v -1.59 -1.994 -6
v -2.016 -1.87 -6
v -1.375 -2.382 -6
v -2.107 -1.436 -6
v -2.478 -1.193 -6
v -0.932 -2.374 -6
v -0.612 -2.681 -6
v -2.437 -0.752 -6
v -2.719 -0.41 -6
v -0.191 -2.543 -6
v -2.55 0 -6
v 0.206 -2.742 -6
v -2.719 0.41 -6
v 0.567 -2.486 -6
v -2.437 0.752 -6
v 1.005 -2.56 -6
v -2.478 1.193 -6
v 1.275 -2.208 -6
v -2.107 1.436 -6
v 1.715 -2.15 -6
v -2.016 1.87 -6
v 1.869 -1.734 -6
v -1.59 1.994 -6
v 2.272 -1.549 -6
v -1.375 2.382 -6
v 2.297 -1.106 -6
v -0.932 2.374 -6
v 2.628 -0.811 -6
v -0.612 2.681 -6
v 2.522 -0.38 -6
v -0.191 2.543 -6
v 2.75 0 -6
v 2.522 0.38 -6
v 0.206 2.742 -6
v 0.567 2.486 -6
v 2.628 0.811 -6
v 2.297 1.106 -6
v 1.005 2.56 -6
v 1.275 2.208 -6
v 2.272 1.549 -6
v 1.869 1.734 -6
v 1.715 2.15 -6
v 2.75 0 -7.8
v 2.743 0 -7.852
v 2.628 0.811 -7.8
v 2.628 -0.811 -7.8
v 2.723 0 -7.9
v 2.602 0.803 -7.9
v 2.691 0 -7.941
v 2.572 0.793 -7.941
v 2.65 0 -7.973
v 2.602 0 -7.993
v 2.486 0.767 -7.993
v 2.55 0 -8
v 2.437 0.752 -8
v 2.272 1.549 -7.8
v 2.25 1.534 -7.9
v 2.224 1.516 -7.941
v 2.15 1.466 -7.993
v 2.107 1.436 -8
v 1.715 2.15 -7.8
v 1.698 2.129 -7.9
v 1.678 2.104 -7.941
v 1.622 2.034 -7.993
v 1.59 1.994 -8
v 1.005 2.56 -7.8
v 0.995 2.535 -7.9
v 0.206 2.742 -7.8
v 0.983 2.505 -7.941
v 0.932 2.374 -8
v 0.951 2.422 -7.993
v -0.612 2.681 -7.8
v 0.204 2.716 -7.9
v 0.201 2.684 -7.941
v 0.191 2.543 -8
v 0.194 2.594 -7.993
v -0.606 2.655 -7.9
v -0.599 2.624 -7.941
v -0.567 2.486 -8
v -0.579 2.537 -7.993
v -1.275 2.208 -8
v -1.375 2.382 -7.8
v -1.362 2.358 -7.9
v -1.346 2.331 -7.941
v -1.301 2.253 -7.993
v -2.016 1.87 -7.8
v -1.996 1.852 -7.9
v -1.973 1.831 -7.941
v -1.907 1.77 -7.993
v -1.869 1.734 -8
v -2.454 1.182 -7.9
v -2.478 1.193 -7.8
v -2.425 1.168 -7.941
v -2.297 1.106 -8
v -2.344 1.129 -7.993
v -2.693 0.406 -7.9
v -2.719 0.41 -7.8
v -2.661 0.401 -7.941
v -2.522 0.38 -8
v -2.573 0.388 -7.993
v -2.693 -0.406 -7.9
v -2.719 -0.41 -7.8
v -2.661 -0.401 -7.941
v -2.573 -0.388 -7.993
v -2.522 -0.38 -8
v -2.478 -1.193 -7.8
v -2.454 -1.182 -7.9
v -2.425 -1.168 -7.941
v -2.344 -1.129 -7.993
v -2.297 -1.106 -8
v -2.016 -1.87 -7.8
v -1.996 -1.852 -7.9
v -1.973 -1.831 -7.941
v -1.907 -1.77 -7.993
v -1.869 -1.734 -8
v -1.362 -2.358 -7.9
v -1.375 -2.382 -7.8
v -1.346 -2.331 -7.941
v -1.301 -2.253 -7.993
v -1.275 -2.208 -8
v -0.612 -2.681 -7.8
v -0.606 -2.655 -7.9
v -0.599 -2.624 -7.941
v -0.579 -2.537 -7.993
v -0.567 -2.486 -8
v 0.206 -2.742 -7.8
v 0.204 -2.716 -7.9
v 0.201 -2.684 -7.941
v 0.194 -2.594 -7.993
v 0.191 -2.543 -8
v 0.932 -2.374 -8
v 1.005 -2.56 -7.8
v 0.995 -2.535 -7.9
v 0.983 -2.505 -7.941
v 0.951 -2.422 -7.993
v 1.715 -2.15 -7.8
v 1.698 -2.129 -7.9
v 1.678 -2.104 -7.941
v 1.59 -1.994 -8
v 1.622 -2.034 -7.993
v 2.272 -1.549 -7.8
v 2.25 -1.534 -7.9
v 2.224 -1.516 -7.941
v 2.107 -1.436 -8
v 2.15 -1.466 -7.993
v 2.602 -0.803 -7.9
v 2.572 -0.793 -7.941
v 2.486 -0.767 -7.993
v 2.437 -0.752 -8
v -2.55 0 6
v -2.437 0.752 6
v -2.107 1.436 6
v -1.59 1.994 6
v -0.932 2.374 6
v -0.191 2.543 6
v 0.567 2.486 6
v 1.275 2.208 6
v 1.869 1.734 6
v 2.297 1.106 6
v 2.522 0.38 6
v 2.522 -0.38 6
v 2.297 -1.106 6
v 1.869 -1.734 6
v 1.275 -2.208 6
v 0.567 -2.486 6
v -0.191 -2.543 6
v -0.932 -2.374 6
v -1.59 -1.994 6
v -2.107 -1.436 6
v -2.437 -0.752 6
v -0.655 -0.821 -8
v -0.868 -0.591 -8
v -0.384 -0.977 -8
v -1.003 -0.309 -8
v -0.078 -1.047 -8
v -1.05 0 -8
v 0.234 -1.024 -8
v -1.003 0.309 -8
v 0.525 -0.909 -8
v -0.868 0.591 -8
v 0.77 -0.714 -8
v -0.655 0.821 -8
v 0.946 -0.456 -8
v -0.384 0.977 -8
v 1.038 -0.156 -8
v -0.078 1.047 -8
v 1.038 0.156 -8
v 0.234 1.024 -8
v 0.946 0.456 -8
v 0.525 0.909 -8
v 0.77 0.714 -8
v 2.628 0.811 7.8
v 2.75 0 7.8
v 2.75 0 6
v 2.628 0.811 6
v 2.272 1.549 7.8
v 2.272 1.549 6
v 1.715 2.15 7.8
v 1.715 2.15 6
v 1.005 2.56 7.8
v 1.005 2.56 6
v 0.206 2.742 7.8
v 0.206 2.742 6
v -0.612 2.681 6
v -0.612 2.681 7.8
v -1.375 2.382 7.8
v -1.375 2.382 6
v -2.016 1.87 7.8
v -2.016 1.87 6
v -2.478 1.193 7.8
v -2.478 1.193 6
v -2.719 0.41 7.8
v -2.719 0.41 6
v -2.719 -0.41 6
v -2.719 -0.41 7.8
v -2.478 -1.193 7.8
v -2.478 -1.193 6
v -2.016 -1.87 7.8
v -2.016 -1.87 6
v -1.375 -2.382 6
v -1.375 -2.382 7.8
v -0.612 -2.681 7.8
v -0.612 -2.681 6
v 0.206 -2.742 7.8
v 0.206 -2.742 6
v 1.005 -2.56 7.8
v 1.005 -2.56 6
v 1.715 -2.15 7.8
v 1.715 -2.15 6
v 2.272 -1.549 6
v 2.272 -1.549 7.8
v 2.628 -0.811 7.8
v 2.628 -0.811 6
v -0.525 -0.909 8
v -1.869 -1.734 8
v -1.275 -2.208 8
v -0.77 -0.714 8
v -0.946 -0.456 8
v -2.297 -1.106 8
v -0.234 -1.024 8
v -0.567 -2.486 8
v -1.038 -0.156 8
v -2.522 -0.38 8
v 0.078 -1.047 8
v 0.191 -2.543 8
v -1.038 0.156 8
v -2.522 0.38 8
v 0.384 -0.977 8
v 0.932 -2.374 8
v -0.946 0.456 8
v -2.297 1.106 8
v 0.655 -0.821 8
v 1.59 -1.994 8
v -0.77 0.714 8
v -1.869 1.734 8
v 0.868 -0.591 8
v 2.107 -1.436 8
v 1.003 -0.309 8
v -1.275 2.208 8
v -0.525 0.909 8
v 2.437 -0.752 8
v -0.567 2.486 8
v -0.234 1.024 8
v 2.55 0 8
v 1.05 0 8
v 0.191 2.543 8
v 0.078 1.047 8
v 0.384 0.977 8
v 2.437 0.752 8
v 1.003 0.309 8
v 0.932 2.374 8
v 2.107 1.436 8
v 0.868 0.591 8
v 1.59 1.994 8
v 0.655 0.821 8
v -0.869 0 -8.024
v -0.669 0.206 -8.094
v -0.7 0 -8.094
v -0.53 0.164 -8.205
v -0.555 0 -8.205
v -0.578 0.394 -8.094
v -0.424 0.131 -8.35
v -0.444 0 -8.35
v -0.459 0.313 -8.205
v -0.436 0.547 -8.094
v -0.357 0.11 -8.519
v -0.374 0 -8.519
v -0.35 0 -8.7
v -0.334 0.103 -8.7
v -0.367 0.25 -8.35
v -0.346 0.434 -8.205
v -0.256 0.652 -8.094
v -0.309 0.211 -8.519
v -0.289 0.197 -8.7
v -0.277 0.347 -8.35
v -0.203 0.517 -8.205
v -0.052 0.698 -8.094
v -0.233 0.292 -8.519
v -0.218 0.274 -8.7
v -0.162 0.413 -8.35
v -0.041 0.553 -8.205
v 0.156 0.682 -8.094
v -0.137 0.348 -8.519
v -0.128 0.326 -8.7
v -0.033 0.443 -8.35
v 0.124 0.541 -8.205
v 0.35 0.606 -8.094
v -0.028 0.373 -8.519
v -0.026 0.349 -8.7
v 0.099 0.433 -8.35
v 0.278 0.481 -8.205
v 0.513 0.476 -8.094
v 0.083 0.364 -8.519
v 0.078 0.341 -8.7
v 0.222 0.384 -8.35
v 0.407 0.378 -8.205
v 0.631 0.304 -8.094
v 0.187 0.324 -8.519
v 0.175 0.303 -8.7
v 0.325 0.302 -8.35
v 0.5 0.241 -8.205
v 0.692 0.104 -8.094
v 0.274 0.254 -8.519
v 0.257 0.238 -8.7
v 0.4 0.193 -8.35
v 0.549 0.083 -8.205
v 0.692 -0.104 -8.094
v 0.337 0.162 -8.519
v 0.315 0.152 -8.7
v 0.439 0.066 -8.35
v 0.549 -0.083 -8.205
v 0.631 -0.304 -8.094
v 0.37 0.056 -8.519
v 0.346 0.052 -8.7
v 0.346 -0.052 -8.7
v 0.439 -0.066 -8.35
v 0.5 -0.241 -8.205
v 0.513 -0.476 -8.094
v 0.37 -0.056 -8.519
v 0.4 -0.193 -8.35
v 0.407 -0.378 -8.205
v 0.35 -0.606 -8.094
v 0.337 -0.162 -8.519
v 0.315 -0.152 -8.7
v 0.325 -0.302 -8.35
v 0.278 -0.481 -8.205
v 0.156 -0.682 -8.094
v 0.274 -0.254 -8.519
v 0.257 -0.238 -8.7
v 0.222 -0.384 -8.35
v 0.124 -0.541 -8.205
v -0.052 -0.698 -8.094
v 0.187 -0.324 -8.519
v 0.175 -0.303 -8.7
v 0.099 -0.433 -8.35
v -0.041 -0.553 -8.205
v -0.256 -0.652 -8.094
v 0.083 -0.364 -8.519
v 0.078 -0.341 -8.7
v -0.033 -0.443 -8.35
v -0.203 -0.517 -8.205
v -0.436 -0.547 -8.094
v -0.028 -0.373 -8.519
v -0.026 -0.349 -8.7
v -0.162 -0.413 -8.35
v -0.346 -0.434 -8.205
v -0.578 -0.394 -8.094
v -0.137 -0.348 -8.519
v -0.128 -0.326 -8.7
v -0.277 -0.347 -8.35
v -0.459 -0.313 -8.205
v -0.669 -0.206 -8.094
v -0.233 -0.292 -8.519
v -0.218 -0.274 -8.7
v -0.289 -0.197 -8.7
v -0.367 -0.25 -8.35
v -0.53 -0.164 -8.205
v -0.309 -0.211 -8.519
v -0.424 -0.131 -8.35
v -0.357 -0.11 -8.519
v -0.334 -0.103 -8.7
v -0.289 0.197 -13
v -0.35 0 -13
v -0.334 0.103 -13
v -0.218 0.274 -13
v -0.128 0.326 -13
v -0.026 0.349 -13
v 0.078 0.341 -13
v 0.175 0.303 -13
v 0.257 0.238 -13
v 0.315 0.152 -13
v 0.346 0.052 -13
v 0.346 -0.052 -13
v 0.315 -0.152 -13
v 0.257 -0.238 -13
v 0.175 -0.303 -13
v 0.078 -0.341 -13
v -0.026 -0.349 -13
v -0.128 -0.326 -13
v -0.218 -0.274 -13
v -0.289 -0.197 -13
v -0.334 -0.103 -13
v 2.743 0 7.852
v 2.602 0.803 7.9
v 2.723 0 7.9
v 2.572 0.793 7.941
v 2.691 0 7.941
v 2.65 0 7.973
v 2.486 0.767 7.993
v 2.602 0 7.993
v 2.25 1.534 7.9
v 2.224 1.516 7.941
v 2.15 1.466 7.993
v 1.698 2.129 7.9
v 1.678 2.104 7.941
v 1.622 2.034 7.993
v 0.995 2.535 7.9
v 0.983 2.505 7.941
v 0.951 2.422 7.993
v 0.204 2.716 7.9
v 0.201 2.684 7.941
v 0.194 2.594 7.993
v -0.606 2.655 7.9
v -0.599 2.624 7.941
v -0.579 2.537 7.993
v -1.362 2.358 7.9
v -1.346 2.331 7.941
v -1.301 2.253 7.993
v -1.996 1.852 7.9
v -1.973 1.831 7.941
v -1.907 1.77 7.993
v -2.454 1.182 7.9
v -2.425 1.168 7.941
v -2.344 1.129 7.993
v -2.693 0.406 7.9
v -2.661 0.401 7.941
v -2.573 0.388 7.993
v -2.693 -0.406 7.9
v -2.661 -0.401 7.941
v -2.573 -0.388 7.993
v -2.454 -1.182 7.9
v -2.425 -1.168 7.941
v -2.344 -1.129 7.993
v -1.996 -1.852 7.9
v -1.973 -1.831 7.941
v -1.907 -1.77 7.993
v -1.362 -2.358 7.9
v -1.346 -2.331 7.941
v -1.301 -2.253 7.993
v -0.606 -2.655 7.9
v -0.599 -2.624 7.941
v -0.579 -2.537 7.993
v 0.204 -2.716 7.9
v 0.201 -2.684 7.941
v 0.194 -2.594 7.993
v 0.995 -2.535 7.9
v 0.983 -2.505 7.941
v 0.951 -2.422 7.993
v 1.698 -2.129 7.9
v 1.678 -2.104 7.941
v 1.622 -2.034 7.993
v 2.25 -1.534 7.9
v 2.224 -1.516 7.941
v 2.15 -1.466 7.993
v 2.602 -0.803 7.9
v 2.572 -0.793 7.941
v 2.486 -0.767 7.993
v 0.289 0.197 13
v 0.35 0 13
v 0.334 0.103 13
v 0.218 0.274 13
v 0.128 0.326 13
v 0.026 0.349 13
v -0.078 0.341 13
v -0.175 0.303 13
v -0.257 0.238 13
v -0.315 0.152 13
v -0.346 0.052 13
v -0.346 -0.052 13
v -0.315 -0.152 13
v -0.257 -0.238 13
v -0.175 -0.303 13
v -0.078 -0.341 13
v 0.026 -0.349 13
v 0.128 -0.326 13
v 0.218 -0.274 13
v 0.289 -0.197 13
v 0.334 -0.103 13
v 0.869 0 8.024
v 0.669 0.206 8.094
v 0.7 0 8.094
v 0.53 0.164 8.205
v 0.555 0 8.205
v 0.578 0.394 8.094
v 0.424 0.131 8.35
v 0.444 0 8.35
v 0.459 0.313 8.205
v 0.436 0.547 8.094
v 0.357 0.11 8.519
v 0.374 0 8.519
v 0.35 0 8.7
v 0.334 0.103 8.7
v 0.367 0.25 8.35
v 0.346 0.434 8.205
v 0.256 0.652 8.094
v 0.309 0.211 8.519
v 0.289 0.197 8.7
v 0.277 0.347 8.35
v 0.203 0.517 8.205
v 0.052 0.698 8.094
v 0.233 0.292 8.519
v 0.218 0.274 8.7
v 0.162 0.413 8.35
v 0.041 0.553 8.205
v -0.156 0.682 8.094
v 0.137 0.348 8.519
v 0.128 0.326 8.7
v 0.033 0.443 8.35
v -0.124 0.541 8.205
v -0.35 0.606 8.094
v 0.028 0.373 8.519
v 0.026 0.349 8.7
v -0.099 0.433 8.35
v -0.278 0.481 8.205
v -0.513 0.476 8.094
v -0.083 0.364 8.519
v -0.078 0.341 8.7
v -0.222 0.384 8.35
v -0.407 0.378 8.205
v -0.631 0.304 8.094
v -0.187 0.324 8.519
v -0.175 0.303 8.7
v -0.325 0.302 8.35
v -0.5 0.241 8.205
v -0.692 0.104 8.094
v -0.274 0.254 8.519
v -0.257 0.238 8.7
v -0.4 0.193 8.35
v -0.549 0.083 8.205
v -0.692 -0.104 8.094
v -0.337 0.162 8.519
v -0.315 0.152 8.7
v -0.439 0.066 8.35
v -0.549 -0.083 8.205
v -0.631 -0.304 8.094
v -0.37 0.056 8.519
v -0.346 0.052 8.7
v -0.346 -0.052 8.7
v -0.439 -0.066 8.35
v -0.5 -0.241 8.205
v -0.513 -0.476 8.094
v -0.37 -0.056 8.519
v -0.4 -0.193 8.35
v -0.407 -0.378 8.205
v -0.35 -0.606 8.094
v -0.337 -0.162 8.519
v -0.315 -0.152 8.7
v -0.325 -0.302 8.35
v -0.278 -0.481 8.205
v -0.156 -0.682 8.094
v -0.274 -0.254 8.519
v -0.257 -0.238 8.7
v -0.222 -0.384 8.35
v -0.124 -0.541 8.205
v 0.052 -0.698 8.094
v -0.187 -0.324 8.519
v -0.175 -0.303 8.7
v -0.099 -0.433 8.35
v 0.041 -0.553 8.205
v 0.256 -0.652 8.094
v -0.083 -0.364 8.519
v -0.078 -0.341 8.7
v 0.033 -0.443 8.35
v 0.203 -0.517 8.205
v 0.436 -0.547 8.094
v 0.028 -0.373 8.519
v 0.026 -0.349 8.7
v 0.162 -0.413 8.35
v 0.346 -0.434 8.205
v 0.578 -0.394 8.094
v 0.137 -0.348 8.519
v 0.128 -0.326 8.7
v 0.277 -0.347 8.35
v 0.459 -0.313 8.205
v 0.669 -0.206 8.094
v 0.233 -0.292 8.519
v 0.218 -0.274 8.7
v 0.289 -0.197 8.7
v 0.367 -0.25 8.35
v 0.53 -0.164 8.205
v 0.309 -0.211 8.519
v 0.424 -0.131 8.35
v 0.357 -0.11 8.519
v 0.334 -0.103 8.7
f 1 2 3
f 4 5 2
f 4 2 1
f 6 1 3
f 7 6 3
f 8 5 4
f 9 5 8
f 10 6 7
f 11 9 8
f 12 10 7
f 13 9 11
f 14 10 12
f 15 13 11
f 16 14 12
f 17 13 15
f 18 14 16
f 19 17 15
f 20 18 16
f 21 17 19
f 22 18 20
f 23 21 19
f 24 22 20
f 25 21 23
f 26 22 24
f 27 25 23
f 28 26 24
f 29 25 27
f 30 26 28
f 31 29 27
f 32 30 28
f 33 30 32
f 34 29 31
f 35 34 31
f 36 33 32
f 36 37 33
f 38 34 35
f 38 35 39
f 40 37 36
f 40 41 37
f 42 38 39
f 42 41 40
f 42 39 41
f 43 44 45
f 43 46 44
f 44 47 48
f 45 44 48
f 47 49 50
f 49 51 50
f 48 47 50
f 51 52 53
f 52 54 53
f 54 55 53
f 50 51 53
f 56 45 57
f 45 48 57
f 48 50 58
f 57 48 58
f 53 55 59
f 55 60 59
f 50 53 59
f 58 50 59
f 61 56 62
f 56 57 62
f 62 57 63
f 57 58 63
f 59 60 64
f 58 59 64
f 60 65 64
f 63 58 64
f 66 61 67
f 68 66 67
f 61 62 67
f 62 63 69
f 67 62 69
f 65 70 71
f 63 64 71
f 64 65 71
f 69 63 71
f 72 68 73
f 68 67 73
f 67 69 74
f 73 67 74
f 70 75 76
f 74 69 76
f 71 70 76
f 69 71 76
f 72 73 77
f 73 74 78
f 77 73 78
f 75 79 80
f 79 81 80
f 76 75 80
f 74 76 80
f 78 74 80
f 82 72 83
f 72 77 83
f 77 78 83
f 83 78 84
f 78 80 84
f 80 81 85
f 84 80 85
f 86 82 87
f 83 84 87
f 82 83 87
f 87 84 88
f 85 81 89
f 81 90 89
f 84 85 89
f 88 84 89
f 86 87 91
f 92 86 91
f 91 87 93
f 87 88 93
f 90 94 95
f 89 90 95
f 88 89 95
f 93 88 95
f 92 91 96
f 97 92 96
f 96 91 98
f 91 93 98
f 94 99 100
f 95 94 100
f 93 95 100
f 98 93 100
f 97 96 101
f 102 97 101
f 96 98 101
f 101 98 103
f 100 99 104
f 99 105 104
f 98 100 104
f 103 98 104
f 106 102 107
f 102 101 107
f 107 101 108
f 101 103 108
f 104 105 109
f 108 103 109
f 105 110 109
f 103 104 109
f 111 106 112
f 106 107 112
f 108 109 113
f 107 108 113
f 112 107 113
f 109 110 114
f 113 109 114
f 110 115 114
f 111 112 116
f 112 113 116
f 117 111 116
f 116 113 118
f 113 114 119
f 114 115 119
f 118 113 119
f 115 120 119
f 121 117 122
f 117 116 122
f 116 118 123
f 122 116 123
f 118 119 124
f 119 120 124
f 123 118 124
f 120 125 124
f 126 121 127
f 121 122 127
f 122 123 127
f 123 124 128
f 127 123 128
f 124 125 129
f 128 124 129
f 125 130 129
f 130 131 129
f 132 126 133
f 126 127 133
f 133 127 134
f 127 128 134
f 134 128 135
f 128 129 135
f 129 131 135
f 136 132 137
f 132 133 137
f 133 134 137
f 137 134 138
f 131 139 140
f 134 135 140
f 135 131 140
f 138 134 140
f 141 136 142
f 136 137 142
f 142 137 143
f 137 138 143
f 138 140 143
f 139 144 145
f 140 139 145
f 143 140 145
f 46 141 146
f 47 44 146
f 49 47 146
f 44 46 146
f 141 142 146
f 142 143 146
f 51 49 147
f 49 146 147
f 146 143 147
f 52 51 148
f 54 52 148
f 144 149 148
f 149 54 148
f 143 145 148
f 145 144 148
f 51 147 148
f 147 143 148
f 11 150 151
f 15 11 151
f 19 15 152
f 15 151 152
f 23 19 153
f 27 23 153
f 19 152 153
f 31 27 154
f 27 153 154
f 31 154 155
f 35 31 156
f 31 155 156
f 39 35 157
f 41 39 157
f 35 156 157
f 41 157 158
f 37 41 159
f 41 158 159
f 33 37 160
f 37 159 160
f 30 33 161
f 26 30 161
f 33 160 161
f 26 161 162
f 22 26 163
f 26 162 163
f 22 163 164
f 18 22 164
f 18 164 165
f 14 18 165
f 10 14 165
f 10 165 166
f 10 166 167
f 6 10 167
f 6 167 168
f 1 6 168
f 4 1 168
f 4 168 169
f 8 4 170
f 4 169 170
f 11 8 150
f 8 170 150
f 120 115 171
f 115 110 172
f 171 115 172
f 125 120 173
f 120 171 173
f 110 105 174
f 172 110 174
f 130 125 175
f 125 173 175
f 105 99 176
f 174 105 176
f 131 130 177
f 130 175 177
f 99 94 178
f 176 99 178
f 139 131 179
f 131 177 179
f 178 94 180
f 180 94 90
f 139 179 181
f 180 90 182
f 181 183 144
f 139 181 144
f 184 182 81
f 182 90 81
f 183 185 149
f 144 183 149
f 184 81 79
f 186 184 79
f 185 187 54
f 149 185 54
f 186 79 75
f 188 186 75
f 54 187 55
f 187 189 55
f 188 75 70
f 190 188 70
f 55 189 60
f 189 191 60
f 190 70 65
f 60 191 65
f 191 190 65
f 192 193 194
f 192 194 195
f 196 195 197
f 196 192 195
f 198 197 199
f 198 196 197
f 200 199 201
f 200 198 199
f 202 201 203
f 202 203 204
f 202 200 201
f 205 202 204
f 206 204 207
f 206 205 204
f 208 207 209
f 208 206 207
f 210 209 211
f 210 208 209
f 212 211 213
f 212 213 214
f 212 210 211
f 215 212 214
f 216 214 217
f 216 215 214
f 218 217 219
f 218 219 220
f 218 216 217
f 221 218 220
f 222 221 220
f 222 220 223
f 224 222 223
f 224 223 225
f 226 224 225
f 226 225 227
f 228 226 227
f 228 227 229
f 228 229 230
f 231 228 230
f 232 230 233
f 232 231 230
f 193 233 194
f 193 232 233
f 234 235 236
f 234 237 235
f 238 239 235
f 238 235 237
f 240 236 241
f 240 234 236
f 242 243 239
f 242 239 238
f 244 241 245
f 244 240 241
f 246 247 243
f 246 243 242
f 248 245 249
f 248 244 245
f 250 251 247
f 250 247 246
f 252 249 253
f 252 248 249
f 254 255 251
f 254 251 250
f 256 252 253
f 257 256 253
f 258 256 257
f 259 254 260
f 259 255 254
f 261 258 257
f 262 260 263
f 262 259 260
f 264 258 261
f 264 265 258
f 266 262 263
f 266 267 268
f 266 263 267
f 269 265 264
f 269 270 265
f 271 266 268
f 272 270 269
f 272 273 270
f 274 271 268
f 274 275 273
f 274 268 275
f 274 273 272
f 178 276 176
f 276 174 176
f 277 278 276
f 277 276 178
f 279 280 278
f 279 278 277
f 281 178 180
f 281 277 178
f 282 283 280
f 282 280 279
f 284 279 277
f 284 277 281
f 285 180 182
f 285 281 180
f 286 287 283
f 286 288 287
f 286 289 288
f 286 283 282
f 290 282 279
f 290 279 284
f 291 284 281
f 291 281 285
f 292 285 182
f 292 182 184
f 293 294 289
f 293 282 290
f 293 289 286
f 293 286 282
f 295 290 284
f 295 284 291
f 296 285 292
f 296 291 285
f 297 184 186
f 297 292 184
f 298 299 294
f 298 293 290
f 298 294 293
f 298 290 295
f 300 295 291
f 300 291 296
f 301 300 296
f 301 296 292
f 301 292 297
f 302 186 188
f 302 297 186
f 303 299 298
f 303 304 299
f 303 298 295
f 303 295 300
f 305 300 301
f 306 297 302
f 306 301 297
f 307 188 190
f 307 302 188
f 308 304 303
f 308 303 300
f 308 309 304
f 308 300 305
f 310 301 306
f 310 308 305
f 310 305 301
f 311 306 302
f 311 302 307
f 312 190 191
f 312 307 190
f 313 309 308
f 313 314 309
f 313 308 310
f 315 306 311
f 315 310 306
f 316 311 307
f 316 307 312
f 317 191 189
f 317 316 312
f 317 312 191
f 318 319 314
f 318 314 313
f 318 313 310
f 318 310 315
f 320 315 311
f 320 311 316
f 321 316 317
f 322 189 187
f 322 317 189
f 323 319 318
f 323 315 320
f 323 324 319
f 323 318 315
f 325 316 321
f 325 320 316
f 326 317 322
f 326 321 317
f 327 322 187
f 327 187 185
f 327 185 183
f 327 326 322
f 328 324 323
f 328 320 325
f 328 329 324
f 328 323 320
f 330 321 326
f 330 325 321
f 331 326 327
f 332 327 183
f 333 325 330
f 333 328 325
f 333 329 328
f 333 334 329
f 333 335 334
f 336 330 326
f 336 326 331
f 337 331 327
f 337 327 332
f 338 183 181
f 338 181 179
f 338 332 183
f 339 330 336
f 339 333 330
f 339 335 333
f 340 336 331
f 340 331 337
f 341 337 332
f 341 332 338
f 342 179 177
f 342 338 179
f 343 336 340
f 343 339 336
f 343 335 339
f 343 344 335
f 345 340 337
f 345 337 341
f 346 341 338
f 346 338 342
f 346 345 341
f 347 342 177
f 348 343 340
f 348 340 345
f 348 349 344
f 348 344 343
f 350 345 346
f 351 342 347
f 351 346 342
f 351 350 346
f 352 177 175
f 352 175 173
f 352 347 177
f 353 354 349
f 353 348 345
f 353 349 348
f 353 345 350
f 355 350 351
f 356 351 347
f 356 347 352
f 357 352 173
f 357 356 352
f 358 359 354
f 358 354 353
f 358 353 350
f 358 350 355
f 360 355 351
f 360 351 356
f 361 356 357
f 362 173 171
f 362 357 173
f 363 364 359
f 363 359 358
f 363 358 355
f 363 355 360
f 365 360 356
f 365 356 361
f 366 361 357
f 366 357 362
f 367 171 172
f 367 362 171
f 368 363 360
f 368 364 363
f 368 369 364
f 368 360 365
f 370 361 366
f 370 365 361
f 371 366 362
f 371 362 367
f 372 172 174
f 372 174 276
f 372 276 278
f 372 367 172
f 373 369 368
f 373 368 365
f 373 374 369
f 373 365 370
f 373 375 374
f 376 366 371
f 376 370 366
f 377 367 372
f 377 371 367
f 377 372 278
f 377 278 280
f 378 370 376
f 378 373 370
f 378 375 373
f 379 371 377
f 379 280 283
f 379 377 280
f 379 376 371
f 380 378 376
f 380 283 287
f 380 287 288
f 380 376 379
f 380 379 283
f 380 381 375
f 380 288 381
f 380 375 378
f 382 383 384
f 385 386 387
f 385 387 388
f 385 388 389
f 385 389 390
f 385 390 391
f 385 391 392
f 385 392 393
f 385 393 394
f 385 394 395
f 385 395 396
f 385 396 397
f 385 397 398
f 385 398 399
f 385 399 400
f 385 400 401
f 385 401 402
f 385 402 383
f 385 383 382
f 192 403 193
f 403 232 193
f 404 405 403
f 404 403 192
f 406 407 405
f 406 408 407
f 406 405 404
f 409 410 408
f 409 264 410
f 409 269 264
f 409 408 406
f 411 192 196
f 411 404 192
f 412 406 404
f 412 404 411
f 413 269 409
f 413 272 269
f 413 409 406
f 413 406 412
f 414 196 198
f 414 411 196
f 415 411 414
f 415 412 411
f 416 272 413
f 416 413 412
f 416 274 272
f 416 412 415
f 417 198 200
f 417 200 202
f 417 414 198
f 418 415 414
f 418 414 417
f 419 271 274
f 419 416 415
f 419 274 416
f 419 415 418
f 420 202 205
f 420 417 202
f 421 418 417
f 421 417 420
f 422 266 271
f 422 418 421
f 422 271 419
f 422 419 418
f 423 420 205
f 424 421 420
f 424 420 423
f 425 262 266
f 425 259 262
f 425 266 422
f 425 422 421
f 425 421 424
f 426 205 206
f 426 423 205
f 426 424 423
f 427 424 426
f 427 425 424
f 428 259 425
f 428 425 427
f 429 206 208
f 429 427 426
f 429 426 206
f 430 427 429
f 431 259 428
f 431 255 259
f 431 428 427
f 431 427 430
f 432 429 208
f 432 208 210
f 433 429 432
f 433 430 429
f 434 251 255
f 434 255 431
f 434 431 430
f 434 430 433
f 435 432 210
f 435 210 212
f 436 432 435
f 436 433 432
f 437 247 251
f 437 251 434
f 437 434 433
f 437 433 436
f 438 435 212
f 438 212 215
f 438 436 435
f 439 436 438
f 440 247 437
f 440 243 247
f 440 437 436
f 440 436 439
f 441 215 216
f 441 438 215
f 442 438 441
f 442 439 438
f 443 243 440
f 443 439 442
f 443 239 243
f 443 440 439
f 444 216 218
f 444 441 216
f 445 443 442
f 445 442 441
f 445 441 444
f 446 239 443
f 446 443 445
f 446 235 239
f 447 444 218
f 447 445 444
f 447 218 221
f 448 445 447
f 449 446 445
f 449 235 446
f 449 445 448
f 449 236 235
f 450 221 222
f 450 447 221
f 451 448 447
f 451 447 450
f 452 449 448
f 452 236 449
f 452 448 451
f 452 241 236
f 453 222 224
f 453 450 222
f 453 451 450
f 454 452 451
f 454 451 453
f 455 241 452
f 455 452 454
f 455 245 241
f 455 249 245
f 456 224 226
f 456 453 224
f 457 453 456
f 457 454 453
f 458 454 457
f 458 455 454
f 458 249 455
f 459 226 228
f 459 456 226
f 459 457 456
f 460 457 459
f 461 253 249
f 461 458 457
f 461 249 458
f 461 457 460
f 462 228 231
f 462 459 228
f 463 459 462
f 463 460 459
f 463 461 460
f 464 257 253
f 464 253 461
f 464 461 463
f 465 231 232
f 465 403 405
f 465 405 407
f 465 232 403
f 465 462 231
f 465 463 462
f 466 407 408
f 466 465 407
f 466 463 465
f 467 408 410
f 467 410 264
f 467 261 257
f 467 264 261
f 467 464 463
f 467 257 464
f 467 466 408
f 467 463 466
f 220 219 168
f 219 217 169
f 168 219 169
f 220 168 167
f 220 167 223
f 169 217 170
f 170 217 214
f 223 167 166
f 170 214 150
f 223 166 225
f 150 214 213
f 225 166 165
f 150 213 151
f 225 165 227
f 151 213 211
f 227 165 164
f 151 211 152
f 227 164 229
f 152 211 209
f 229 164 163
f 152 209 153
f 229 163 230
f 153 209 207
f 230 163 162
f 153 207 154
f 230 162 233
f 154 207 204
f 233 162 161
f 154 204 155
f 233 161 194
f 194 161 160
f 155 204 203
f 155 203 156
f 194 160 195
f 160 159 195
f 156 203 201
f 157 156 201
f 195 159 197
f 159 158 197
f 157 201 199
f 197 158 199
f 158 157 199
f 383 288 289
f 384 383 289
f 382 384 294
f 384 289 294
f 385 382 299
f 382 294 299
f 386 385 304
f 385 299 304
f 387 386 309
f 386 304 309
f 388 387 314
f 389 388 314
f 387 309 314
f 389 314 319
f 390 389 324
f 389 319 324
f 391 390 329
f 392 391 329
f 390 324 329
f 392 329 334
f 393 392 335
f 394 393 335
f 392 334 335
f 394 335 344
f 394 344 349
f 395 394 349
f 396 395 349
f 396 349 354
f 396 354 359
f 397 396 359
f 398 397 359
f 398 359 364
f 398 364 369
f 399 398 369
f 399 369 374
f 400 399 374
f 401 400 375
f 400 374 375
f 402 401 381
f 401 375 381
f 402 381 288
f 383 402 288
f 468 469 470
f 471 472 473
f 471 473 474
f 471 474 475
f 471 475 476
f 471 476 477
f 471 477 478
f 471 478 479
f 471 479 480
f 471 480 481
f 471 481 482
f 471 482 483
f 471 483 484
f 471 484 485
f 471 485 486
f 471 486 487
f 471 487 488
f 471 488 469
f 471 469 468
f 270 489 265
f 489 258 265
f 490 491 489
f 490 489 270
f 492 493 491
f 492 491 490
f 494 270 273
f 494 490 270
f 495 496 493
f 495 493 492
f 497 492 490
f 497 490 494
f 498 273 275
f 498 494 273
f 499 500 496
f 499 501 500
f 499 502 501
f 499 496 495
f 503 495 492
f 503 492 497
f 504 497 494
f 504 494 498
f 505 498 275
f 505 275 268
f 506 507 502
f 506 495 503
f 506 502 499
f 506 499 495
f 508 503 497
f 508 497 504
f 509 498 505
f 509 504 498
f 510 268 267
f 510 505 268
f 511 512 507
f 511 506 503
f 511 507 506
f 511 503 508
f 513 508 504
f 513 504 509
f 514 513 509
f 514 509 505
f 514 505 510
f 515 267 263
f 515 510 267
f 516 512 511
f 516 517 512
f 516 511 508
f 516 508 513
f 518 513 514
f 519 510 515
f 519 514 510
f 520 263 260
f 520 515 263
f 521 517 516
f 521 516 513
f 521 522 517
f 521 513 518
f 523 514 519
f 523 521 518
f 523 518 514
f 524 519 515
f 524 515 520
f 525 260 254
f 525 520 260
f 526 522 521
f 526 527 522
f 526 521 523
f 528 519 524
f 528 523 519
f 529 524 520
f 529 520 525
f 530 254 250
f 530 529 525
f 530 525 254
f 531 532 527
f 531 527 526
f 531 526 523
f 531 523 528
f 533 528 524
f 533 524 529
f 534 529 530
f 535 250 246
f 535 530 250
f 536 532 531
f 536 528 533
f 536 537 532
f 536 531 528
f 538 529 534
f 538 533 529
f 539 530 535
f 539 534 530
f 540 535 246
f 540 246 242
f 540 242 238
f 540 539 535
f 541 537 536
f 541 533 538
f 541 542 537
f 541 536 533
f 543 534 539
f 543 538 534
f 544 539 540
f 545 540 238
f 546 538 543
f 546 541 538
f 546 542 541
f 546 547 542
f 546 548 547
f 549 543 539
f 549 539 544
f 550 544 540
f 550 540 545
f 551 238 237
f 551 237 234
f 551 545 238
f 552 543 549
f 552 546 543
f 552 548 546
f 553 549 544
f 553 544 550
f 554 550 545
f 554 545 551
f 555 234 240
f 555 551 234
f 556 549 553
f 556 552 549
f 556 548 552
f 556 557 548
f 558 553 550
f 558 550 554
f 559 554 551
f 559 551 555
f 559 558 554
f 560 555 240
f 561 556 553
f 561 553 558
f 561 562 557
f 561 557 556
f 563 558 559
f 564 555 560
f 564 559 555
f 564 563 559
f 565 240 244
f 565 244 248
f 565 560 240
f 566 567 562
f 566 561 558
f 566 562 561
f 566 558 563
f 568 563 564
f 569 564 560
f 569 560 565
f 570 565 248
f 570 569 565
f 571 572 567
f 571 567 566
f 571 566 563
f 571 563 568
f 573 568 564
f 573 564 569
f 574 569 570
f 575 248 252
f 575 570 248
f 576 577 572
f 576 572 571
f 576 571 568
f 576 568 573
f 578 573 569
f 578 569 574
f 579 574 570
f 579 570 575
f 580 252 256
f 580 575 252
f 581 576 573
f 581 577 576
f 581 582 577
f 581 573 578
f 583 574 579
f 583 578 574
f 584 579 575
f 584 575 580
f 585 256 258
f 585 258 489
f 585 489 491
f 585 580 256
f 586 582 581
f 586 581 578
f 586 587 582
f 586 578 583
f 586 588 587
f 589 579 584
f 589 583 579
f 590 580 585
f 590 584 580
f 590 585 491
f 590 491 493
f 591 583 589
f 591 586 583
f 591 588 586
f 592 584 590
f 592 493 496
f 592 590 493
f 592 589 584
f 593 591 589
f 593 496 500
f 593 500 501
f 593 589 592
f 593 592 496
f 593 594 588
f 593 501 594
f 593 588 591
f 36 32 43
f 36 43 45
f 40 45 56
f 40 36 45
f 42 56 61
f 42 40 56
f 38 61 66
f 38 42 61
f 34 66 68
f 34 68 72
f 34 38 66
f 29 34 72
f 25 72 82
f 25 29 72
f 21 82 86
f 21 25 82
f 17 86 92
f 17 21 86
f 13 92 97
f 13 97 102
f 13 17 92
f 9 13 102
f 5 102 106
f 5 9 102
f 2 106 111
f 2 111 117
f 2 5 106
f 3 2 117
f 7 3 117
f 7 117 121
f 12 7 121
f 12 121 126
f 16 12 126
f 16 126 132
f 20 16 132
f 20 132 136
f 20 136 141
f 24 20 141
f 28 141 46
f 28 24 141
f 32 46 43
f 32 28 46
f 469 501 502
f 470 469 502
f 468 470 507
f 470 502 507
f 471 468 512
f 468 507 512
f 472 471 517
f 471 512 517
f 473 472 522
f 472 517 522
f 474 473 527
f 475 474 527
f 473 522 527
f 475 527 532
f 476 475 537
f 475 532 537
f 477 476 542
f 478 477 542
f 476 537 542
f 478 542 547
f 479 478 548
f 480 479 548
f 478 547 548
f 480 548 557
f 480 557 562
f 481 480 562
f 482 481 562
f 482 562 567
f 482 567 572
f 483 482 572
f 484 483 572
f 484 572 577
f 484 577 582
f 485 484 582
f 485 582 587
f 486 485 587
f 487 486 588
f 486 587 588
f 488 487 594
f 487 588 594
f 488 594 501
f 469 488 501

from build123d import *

# Parameters (mm, degrees)
SKETCH1_R           = 2.75
BOSS_EXTRUDE1_DEPTH = 2
SKETCH2_R           = 2.55
BOSS_EXTRUDE2_DEPTH = 12
SKETCH3_R           = 2.75
BOSS_EXTRUDE3_DEPTH = 2
SKETCH4_R           = 0.35
BOSS_EXTRUDE4_DEPTH = 5
SKETCH5_R           = 0.35
BOSS_EXTRUDE5_DEPTH = 5
FILLET1_R           = 0.2
FILLET2_R           = 0.7


with BuildPart() as part:
    # Sketch1 → Boss-Extrude1 (new body)
    with BuildSketch(Plane.XY.offset(8)):
        Circle(SKETCH1_R)
    extrude(amount=-BOSS_EXTRUDE1_DEPTH)

    # Sketch2 → Boss-Extrude2 (add)
    with BuildSketch(Plane(origin=(0, 0, 6), x_dir=(-1, 0, 0), z_dir=(0, 0, -1))):
        Circle(SKETCH2_R)
    extrude(amount=BOSS_EXTRUDE2_DEPTH)

    # Sketch3 → Boss-Extrude3 (add)
    with BuildSketch(Plane.XY.offset(-6)):
        Circle(SKETCH3_R)
    extrude(amount=-BOSS_EXTRUDE3_DEPTH)

    # Sketch4 → Boss-Extrude4 (add)
    with BuildSketch(Plane.XY.offset(8)):
        Circle(SKETCH4_R)
    extrude(amount=BOSS_EXTRUDE4_DEPTH)

    # Sketch5 → Boss-Extrude5 (add)
    with BuildSketch(Plane(origin=(0, 0, -8), x_dir=(-1, 0, 0), z_dir=(0, 0, -1))):
        Circle(SKETCH5_R)
    extrude(amount=BOSS_EXTRUDE5_DEPTH)

    # Fillet1
    fillet1_edges = [part.edges().sort_by_distance(p)[0] for p in [
        (-2.75, 0, 8),
        (-2.75, 0, -8),
    ]]
    fillet(fillet1_edges, radius=FILLET1_R)

    # Fillet2
    fillet2_edges = [part.edges().sort_by_distance(p)[0] for p in [
        (-0.35, 0, 8),
        (0.35, 0, -8),
    ]]
    fillet(fillet2_edges, radius=FILLET2_R)


solid = part.part
